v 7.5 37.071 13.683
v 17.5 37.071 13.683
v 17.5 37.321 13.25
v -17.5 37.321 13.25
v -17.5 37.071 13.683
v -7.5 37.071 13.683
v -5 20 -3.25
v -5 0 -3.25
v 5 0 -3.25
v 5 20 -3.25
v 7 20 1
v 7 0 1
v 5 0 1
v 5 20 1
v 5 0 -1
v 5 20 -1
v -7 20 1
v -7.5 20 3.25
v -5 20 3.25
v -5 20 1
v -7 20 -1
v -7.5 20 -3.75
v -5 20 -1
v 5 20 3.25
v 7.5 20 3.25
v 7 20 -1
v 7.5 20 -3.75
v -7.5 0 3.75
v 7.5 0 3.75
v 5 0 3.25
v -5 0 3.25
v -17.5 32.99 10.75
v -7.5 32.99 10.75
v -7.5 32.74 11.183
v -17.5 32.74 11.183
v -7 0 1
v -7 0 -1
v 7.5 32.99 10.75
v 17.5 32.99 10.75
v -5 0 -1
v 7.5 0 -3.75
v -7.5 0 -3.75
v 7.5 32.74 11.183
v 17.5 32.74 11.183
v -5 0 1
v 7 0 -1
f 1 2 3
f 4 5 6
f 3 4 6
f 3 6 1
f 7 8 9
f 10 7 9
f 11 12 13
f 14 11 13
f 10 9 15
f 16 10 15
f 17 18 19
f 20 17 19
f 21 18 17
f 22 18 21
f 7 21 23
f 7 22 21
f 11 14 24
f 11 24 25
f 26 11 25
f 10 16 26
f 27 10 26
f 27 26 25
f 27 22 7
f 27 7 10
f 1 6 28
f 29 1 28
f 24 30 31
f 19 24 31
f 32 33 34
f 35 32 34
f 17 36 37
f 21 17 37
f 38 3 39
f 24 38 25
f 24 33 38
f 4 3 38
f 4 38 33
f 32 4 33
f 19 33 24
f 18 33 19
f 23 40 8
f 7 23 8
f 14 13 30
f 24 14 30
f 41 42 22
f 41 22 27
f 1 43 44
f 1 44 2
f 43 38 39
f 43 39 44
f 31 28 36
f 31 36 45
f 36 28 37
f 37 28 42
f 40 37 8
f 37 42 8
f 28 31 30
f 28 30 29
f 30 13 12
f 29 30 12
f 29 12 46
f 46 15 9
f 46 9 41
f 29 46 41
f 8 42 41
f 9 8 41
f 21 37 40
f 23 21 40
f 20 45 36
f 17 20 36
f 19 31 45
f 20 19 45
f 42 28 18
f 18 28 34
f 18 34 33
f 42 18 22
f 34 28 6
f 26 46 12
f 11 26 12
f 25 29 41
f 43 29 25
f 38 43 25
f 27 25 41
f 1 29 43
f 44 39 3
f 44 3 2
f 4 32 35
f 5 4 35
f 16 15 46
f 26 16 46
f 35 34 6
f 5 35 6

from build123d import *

# Parameters (mm, degrees)
SKIZZE1_W                       = 15
SKIZZE1_H                       = 7.5
AUFSATZ_LINEAR_AUSTRAGEN1_DEPTH = 20
AUFSATZ_LINEAR_AUSTRAGEN2_DEPTH = 15
AUFSATZ_LINEAR_AUSTRAGEN3_DEPTH = 10


with BuildPart() as part:
    # Skizze1 → Aufsatz-Linear austragen1 (new body)
    with BuildSketch(Plane(origin=(0, 0, 0), x_dir=(1, 0, 0), z_dir=(0, 1, 0))):
        Rectangle(SKIZZE1_W, SKIZZE1_H)
        Polygon((-5, 1), (-5, 3.25), (5, 3.25), (5, 1), (7, 1), (7, -1), (5, -1), (5, -3.25), (-5, -3.25), (-5, -1), (-7, -1), (-7, 1), align=None, mode=Mode.SUBTRACT)
    extrude(amount=AUFSATZ_LINEAR_AUSTRAGEN1_DEPTH)

    # Skizze2 → Aufsatz-Linear austragen2 (add)
    with BuildSketch(Plane.ZY.offset(7.5)):
        Polygon((3.75, 0), (3.75, 20), (3.25, 20), (13.25, 37.320508076), (13.683012702, 37.070508076), align=None)
    extrude(amount=-AUFSATZ_LINEAR_AUSTRAGEN2_DEPTH)

    # Skizze4 → Aufsatz-Linear austragen3 (add)
    with BuildSketch(Plane.ZY.offset(7.5)):
        Polygon((10.75, 32.990381057), (11.183012702, 32.740381057), (13.683012702, 37.070508076), (13.25, 37.320508076), align=None)
    aufsatz_linear_austragen3 = extrude(amount=AUFSATZ_LINEAR_AUSTRAGEN3_DEPTH)

    # Spiegeln3: Aufsatz-Linear austragen3 across plane
    add(aufsatz_linear_austragen3.mirror(Plane(origin=(0, 0, 0), x_dir=(0, 0, 1), z_dir=(1, 0, 0))))


solid = part.part
